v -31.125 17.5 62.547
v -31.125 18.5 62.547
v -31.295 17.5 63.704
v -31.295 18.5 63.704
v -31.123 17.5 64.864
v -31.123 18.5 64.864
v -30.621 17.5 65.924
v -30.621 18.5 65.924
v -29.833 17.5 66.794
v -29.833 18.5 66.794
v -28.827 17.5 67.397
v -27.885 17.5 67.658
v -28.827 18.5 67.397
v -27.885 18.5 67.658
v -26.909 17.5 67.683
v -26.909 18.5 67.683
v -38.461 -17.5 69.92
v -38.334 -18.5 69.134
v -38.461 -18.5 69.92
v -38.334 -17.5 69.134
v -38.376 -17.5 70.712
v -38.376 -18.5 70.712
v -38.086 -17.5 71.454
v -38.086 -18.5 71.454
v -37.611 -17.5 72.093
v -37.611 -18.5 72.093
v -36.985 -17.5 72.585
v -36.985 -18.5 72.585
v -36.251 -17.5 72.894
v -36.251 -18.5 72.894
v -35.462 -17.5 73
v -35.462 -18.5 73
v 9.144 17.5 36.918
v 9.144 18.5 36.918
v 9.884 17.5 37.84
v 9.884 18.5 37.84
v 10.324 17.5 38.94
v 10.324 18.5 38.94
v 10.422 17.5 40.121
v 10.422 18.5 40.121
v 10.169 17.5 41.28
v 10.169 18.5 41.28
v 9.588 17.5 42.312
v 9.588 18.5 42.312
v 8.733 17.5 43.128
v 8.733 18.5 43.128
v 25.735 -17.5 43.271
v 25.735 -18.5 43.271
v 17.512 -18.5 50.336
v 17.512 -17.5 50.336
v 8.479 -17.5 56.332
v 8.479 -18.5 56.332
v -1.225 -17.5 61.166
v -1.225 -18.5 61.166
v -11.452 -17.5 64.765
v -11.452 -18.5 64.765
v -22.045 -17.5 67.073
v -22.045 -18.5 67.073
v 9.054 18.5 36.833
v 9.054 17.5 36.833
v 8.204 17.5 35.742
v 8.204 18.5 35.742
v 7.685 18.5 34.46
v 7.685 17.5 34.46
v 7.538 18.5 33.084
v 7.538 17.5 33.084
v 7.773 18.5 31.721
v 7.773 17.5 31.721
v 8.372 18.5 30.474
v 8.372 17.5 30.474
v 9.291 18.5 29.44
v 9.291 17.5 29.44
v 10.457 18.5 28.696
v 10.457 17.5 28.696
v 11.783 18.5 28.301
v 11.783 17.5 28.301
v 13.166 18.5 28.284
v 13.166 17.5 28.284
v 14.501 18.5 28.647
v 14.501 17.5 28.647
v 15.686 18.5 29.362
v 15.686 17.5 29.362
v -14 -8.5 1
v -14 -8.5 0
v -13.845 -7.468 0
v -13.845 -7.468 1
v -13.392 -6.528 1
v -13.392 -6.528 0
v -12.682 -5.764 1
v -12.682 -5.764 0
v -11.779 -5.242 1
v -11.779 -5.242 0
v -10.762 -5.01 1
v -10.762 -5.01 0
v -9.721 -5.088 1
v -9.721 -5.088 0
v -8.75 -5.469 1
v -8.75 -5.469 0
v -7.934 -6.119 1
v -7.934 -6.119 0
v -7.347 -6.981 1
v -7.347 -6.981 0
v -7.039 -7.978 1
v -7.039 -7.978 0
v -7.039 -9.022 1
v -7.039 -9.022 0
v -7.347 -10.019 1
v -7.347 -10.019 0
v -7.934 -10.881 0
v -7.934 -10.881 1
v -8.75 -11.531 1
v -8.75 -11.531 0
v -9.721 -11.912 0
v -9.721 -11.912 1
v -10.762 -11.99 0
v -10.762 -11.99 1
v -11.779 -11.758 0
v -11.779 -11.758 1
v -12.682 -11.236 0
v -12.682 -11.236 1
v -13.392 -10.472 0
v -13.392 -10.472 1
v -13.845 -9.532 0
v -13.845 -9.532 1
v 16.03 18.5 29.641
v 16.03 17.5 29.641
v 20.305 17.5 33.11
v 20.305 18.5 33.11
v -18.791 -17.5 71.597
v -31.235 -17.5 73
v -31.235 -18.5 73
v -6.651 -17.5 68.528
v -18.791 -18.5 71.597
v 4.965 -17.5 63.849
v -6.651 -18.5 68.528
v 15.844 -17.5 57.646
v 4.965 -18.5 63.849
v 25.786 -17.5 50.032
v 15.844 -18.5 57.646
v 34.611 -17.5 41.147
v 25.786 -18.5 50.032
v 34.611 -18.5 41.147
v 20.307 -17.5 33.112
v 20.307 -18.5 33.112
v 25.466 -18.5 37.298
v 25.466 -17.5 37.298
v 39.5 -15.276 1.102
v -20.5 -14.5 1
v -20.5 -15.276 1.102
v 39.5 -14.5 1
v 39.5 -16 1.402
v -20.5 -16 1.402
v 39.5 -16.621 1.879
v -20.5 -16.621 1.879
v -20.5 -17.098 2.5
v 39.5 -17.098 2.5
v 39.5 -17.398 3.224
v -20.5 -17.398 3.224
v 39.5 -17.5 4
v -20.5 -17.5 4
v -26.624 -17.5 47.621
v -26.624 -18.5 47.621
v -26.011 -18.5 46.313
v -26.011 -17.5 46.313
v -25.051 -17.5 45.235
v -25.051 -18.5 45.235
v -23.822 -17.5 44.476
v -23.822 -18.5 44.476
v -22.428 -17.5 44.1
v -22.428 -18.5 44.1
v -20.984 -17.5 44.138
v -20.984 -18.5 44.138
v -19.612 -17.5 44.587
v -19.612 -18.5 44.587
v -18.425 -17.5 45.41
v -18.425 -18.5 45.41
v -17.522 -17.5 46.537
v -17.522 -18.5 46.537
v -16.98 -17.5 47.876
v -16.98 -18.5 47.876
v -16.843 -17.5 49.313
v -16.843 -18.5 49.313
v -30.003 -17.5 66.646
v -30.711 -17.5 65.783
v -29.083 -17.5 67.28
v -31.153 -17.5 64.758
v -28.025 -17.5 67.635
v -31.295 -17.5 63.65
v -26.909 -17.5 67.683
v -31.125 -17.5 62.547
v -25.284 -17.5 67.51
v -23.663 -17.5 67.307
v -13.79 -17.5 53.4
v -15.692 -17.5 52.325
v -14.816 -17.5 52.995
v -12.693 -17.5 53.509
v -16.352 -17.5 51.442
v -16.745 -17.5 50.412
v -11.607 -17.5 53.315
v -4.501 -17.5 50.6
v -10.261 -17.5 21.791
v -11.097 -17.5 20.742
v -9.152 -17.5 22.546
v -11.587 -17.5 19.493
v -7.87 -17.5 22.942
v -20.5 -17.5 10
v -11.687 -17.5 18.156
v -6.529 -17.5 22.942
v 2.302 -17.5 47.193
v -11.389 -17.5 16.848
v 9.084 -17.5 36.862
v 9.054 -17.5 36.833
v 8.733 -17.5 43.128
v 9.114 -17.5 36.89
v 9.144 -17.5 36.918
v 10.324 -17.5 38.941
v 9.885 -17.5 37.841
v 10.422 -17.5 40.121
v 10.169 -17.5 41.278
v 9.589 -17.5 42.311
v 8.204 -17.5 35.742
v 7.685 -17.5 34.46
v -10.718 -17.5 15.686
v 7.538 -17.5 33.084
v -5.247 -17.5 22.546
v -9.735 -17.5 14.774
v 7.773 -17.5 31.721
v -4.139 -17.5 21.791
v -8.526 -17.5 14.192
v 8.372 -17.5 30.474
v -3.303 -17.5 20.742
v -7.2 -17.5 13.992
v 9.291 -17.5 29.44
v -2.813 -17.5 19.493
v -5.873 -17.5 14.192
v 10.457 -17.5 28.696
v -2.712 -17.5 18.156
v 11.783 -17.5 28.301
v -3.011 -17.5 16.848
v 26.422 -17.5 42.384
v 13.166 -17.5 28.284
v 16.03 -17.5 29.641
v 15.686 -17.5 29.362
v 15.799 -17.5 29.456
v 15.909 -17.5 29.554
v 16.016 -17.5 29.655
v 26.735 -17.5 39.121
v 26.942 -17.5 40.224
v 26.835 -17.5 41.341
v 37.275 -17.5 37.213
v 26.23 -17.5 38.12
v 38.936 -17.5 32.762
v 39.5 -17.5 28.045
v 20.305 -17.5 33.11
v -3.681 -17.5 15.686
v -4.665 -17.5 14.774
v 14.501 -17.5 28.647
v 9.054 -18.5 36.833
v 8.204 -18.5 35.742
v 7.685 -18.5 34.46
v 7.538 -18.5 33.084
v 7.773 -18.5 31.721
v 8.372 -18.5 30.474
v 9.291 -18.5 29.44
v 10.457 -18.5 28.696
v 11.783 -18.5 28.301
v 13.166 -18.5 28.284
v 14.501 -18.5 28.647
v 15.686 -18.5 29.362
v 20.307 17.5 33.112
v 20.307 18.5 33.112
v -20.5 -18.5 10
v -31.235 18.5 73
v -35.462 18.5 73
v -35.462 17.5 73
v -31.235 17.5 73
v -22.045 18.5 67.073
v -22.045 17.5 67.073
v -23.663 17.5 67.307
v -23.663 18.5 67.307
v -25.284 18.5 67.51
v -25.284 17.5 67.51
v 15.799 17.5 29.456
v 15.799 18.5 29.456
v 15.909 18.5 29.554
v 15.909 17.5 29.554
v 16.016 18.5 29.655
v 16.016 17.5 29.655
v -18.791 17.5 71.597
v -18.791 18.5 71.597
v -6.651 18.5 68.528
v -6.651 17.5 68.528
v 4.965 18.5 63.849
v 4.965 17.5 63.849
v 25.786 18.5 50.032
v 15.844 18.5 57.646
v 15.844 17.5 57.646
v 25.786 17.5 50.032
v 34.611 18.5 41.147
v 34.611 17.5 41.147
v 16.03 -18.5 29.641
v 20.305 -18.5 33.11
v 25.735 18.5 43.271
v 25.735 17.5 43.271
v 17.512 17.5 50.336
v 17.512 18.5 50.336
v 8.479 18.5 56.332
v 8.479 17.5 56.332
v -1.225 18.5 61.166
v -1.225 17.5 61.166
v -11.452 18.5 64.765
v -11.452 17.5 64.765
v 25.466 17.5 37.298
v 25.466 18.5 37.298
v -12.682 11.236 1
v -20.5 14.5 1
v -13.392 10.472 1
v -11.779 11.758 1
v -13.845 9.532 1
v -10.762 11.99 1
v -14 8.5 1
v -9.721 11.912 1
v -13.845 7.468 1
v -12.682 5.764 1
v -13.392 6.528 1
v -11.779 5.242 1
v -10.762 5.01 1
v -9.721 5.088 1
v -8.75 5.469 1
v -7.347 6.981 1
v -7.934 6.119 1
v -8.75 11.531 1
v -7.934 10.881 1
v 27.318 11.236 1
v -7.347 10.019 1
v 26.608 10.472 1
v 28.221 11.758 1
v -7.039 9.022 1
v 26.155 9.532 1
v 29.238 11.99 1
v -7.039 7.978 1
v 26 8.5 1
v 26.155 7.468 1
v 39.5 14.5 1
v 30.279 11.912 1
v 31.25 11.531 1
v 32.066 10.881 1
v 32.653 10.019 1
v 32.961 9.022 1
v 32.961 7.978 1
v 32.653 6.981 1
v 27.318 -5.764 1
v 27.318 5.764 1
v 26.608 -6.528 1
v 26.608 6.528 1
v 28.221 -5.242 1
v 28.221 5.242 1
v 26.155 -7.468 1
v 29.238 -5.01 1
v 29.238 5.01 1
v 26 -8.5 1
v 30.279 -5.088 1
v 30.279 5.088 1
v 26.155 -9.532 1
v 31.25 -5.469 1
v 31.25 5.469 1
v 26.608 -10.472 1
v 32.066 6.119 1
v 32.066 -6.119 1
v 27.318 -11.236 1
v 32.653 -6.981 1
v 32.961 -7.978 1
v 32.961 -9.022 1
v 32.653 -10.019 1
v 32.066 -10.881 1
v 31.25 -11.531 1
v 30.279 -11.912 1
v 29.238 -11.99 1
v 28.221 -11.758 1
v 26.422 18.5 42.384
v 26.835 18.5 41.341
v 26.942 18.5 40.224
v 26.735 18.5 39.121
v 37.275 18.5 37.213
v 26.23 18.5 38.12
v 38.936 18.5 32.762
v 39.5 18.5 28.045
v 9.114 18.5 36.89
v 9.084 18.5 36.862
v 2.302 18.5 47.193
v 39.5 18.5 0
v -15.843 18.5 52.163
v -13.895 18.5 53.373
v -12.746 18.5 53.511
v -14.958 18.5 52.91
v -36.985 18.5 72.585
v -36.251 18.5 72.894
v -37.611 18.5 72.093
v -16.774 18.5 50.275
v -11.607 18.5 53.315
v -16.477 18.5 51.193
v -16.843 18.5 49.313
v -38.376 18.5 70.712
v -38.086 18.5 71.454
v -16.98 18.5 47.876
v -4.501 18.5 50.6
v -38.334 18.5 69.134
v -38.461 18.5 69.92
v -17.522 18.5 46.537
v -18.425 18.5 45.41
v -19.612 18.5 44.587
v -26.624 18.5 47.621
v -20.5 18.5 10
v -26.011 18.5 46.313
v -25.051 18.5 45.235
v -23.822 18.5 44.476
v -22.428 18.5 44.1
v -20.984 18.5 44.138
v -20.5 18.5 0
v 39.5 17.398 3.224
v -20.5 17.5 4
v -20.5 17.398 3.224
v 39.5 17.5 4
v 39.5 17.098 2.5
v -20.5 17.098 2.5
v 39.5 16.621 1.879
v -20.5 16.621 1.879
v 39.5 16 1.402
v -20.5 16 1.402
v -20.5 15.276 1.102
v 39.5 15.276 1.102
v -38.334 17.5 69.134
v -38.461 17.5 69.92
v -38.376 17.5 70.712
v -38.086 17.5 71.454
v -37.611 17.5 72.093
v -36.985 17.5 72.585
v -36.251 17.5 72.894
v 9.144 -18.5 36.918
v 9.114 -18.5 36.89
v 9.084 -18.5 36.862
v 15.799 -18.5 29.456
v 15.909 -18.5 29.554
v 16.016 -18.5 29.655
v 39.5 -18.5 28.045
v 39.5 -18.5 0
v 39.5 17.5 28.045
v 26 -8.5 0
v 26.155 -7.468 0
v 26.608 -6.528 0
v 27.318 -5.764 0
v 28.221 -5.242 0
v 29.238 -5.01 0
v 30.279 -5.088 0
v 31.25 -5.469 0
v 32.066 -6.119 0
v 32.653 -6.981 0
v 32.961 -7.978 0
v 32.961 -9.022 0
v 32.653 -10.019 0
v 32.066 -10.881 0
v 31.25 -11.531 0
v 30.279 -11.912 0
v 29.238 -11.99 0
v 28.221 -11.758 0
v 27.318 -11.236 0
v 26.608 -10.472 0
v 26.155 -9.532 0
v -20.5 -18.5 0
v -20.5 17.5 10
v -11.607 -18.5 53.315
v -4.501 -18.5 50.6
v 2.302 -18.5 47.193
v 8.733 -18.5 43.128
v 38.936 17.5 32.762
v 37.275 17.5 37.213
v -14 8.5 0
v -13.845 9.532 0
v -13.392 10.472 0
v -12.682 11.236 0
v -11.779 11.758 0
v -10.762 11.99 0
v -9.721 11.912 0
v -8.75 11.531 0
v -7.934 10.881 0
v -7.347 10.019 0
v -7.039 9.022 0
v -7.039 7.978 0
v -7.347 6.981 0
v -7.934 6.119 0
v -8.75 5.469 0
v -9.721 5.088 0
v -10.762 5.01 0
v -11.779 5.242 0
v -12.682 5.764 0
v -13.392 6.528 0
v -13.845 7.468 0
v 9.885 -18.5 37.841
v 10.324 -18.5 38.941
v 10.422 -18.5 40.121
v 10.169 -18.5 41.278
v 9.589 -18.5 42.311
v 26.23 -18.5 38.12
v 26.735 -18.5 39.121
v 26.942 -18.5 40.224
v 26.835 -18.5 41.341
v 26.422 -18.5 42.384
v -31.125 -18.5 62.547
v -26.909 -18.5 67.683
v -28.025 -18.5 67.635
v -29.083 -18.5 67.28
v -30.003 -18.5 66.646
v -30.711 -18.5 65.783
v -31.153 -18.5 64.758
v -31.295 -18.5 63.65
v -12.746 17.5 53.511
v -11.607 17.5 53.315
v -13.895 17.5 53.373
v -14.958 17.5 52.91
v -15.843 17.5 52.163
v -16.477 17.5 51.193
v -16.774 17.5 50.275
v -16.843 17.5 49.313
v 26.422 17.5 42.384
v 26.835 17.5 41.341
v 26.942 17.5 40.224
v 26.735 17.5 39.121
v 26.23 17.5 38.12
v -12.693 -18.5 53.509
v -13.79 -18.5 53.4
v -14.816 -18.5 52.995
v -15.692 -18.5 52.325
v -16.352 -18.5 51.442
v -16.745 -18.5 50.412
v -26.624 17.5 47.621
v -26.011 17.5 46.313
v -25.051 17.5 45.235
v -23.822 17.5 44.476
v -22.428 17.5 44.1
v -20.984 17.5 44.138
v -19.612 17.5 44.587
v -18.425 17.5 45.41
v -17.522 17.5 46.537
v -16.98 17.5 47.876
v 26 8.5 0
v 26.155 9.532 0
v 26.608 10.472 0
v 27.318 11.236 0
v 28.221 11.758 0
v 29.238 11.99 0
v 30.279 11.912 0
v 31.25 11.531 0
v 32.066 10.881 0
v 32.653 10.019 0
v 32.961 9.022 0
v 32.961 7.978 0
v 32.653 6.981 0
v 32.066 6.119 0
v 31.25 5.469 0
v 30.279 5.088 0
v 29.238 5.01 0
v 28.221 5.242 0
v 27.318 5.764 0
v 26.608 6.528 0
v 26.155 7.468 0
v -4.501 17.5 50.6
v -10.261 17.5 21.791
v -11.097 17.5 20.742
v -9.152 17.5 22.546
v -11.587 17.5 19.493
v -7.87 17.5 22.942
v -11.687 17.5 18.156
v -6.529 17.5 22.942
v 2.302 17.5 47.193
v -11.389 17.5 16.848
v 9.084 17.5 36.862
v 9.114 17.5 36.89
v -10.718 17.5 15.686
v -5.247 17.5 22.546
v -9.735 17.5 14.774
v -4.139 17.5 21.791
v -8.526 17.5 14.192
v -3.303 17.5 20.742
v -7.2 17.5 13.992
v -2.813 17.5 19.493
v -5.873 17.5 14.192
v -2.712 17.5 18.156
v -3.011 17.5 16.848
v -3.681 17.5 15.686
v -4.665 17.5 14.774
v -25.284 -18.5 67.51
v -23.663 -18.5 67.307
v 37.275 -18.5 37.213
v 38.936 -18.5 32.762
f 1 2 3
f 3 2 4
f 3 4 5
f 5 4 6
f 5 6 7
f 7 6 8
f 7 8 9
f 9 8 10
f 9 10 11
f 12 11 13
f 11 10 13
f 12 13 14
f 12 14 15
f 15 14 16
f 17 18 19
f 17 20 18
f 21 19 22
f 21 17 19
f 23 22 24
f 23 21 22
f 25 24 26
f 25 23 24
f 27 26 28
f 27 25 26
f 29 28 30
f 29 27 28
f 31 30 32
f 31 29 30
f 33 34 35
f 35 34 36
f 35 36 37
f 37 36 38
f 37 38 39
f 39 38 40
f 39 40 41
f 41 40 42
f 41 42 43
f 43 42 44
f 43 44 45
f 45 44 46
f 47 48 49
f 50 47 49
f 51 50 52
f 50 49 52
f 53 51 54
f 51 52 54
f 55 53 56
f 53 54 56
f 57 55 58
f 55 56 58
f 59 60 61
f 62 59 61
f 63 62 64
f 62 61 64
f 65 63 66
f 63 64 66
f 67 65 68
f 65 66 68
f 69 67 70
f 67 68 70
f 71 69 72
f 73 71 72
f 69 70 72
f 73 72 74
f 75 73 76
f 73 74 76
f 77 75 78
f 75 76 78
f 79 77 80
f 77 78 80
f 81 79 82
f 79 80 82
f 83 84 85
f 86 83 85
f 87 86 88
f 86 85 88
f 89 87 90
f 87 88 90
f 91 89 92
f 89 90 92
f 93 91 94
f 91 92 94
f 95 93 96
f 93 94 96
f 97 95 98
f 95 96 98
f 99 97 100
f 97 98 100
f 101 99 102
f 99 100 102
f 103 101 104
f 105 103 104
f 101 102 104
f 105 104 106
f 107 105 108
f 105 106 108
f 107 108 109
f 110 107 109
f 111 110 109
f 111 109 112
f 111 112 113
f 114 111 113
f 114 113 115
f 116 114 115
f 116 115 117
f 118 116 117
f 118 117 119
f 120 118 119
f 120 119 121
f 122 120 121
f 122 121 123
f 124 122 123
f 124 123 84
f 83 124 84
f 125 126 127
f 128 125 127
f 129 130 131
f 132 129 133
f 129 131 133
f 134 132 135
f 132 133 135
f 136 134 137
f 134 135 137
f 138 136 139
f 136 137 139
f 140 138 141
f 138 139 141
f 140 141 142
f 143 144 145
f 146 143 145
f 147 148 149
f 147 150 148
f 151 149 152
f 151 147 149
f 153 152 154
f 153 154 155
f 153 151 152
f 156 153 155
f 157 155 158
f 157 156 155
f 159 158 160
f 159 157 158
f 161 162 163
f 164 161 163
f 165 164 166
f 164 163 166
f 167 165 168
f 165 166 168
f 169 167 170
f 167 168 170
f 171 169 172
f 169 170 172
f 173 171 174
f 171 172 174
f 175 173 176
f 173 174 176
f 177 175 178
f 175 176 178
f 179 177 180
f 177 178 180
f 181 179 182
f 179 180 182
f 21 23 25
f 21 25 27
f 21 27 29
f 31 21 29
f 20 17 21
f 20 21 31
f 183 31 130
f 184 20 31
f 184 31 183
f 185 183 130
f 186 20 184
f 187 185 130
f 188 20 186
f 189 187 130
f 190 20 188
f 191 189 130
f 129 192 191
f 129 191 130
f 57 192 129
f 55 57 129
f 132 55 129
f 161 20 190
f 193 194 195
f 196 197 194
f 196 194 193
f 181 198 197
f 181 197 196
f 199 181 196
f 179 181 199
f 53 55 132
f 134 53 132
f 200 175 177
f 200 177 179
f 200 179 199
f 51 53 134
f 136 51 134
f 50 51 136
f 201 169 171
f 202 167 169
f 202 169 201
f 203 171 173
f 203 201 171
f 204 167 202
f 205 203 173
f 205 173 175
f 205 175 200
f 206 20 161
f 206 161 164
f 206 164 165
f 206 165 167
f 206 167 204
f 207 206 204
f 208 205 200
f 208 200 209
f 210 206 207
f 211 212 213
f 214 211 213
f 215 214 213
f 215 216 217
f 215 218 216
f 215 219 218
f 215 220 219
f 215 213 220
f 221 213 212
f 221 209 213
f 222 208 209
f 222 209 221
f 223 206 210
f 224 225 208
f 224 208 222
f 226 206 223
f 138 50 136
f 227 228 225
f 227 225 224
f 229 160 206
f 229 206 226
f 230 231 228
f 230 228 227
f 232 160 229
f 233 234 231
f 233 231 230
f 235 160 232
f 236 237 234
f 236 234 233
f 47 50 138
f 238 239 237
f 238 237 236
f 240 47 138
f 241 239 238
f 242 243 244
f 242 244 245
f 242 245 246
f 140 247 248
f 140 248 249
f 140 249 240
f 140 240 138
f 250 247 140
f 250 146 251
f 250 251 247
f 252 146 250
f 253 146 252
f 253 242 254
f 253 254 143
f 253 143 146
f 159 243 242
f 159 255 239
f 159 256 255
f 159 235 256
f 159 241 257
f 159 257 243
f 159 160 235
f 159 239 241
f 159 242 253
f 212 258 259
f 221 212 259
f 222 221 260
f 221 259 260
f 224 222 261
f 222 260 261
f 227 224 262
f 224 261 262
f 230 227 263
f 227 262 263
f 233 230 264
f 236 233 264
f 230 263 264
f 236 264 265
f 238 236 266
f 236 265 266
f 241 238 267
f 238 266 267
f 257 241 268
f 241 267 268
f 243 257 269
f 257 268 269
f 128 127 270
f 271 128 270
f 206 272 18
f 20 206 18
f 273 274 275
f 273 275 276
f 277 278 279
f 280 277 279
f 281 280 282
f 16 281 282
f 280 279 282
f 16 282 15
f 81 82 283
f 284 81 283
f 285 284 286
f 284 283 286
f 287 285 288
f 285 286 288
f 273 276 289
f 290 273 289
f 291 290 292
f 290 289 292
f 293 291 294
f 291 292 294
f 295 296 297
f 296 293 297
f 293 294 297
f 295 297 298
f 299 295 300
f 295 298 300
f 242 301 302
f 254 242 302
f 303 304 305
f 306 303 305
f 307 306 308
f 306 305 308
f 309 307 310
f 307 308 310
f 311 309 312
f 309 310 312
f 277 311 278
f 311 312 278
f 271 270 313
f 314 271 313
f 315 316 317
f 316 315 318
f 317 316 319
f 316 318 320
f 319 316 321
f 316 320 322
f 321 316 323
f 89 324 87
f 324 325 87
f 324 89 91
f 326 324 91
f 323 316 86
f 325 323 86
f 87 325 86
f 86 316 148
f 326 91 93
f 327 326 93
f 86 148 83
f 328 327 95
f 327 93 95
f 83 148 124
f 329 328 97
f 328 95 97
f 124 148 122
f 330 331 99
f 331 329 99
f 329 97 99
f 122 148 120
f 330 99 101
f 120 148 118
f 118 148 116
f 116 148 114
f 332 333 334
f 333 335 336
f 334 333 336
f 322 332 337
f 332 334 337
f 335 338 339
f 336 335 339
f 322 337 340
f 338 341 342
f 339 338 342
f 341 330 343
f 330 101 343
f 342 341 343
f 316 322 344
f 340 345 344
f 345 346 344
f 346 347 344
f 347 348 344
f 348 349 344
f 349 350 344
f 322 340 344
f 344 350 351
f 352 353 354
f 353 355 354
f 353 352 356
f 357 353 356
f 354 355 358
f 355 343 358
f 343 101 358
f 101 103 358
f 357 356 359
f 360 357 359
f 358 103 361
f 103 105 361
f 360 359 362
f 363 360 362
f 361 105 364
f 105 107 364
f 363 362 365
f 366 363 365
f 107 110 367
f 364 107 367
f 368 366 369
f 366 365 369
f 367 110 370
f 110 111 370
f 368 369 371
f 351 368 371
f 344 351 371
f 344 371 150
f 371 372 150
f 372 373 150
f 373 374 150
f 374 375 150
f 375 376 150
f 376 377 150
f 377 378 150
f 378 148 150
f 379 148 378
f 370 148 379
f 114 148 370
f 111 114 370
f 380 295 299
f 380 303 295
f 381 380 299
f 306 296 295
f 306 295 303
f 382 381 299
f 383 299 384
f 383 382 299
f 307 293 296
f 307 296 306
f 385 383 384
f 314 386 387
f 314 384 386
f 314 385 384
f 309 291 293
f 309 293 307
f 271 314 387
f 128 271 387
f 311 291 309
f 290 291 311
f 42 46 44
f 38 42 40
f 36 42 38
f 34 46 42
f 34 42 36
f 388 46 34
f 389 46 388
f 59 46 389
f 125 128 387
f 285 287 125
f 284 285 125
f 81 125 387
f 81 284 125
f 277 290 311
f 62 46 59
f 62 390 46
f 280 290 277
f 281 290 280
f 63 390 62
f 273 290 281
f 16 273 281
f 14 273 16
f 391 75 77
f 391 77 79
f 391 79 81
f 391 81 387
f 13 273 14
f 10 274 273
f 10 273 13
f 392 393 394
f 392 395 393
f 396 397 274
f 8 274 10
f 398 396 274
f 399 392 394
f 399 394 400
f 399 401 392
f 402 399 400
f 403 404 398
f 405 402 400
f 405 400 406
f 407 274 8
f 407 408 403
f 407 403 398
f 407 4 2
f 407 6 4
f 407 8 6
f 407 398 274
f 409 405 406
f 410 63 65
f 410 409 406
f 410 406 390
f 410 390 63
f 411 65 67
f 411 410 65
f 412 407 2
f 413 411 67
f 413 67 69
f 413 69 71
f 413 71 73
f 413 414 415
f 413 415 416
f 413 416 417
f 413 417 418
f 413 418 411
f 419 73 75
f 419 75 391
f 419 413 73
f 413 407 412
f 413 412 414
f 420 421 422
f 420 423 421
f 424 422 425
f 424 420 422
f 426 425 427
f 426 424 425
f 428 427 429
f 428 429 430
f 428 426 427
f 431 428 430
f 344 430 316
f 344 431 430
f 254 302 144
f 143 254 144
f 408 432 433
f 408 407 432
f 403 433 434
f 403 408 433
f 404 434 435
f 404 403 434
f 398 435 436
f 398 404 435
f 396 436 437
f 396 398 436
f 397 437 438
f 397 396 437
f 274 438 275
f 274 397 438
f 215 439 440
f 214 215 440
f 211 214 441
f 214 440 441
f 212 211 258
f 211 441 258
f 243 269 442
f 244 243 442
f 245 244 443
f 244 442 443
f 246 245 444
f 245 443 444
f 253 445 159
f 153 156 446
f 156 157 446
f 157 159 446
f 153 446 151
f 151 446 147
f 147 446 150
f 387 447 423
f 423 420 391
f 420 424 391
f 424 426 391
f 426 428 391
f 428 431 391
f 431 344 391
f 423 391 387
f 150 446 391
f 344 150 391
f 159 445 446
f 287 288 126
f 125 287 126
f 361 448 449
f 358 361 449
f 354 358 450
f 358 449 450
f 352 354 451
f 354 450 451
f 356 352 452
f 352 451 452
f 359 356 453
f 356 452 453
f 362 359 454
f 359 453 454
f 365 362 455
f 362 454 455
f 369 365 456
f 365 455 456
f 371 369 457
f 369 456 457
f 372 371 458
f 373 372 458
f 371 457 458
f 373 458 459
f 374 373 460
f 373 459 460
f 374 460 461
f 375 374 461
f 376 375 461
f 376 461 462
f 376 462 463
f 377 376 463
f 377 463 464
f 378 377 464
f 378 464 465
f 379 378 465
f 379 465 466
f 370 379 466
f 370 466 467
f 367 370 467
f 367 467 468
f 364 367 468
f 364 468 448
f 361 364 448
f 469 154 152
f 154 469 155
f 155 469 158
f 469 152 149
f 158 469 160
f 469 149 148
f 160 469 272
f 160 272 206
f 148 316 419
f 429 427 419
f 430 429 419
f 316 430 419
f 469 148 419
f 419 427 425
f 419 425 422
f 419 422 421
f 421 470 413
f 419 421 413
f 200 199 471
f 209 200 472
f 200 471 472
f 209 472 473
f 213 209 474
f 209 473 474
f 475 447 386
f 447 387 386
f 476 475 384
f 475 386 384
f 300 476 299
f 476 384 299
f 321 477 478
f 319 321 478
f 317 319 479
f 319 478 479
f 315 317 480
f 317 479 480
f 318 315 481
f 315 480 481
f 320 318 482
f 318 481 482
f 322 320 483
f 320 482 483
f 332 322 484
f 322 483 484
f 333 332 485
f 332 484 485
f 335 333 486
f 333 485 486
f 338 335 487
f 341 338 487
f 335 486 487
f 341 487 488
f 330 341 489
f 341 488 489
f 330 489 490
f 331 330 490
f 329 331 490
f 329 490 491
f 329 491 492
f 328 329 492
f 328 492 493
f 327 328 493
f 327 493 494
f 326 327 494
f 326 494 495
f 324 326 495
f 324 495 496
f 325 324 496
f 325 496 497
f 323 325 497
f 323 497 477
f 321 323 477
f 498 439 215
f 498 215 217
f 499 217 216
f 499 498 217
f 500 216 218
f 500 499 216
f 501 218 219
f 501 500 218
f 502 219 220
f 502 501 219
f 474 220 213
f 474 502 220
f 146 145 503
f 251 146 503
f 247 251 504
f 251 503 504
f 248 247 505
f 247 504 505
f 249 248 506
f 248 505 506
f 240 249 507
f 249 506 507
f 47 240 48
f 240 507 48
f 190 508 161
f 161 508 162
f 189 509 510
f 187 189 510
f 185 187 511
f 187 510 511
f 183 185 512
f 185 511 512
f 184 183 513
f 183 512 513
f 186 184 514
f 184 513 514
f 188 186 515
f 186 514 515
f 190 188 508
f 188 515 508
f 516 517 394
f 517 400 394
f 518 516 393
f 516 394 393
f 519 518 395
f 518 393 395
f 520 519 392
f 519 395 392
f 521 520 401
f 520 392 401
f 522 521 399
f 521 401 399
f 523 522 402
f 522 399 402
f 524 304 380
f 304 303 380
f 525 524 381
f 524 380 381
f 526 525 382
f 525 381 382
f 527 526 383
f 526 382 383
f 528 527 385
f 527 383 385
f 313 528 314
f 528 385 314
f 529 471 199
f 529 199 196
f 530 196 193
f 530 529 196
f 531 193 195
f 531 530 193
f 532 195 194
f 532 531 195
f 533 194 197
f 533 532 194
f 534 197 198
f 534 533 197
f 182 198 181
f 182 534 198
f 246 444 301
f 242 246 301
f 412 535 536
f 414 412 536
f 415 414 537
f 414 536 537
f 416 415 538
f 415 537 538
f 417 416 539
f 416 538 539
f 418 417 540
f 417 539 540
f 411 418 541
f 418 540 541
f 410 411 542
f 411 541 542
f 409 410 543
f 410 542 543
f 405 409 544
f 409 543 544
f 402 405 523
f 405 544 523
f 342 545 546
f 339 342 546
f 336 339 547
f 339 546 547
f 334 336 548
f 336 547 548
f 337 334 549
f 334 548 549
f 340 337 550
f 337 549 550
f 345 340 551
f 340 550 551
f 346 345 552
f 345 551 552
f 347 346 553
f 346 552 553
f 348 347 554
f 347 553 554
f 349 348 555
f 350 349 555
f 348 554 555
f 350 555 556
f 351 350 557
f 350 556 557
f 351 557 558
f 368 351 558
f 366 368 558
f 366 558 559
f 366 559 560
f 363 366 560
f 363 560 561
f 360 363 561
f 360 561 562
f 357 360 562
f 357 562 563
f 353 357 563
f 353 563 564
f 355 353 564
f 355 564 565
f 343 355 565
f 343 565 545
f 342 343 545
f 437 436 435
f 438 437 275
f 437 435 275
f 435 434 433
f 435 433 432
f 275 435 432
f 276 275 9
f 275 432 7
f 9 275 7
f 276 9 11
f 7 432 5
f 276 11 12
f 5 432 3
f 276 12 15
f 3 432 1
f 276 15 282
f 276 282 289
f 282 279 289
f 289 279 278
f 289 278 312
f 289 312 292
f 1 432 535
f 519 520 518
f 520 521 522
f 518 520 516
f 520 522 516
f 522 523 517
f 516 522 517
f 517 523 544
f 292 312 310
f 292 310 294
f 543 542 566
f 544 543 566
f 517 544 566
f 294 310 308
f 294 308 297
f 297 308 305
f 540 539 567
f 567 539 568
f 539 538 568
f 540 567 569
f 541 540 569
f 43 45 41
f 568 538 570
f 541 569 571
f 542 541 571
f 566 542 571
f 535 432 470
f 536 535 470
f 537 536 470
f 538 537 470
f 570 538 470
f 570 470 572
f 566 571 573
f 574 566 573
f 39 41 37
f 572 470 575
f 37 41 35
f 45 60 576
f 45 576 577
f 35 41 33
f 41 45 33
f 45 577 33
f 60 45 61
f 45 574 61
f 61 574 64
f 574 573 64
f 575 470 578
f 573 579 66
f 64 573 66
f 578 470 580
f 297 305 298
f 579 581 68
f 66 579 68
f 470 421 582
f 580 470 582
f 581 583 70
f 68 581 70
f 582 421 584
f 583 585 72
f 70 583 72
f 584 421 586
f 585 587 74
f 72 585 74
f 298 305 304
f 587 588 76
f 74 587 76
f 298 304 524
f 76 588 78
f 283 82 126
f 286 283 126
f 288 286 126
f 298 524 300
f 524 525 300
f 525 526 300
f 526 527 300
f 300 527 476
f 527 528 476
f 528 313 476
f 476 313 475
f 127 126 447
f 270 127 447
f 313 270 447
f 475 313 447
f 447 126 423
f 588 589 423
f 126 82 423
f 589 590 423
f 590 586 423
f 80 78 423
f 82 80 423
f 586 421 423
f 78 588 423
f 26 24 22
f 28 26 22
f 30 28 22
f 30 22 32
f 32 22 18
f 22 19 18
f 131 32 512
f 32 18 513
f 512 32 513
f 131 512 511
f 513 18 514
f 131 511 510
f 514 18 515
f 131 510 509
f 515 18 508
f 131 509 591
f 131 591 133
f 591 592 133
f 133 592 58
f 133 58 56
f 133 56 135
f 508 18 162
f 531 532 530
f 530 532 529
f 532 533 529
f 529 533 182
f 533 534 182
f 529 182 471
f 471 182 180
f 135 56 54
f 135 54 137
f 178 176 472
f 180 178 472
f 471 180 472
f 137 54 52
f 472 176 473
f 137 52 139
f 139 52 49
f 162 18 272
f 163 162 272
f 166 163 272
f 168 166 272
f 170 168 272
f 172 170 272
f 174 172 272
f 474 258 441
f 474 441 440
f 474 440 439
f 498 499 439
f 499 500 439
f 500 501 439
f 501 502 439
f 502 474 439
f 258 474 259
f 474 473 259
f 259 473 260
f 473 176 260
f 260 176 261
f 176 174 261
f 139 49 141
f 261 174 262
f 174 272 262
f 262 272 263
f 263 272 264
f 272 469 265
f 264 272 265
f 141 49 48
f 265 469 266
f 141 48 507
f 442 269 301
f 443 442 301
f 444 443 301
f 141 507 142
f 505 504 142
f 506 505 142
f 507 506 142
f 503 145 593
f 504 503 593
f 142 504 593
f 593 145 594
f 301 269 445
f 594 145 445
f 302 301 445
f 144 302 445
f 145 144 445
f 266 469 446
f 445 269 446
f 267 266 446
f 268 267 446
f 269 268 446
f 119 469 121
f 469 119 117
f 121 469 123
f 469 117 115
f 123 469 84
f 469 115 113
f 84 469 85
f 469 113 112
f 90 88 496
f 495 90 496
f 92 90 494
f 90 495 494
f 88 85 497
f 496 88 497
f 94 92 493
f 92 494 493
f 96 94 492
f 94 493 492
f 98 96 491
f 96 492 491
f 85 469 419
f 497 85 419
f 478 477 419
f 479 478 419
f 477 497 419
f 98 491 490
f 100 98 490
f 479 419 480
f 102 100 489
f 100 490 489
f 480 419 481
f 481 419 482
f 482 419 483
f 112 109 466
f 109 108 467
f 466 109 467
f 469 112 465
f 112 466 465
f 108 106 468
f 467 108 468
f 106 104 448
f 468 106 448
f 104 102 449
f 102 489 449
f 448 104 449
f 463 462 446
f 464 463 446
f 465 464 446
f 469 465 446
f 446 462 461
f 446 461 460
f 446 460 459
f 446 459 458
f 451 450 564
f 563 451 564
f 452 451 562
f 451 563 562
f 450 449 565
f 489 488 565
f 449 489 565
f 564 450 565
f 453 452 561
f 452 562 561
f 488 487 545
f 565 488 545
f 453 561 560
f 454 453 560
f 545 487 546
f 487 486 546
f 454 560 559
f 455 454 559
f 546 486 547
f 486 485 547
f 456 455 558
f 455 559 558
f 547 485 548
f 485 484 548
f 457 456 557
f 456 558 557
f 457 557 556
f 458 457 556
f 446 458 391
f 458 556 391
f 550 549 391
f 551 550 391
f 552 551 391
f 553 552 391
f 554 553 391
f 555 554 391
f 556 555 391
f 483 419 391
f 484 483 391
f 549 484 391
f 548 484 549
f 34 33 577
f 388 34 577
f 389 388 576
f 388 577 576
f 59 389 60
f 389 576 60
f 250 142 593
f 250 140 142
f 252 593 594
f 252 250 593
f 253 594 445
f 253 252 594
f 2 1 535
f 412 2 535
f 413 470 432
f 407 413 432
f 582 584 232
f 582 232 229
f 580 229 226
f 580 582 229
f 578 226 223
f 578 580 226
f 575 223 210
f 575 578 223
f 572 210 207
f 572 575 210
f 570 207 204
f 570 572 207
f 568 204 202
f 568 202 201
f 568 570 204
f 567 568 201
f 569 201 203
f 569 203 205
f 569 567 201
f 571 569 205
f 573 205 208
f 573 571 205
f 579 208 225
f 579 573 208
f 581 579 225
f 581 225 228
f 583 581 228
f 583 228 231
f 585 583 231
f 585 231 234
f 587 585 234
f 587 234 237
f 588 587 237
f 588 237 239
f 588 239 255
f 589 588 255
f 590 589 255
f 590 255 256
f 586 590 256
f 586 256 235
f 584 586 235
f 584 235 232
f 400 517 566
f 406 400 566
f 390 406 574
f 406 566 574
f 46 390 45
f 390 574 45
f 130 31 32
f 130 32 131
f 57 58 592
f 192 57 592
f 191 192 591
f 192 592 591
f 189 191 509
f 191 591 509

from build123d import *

# Parameters (mm, degrees)
CROQUIS1_W                   = 79
CROQUIS1_H                   = 35
SALIENTE_EXTRUIR1_DEPTH      = 1
SALIENTE_EXTRUIR3_DEPTH      = 72
SALIENTE_EXTRUIR3_DEPTH_BACK = 1
CROQUIS2_W                   = 79
CROQUIS2_H                   = 1
CORTAR_EXTRUIR1_DEPTH        = 72
CORTAR_EXTRUIR2_DEPTH        = 72
CORTAR_EXTRUIR3_DEPTH        = 72
REDONDEO4_R                  = 3
REDONDEO5_R                  = 20
REDONDEO6_R                  = 3
CORTAR_EXTRUIR4_DEPTH        = 72
REDONDEO7_START              = -18.5
REDONDEO7_DEPTH              = 1
REDONDEO7_2_DEPTH            = 1
REDONDEO8_R                  = 4
REDONDEO9_R                  = 3
CROQUIS8_R                   = 3.5
CORTAR_EXTRUIR5_DEPTH        = 72
CROQUIS13_R                  = 4.5
SALIENTE_EXTRUIR7_DEPTH      = 37


with BuildPart() as part:
    # Croquis1 → Saliente-Extruir1 (new body)
    with BuildSketch(Plane.XY):
        Rectangle(CROQUIS1_W, CROQUIS1_H)
    extrude(amount=SALIENTE_EXTRUIR1_DEPTH)

    # Croquis2 → Saliente-Extruir3 (add, two sides: drawn at the far end of the back side and taken through both)
    with BuildSketch(Plane.XY.offset(1).offset(-SALIENTE_EXTRUIR3_DEPTH_BACK)):
        with Locations((0, -18)):
            Rectangle(CROQUIS2_W, CROQUIS2_H)
        with Locations((0, 18)):
            Rectangle(CROQUIS2_W, CROQUIS2_H)
    extrude(amount=SALIENTE_EXTRUIR3_DEPTH + SALIENTE_EXTRUIR3_DEPTH_BACK)

    # Croquis3 → Cortar-Extruir1 (cut)
    with BuildSketch(Plane.XZ.offset(18.5)):
        Polygon((-39.5, 1), (-20.5, 1), (-20.5, 10), (-39.5, 73), align=None)
    extrude(amount=-CORTAR_EXTRUIR1_DEPTH, mode=Mode.SUBTRACT)

    # Croquis4 → Cortar-Extruir2 (cut)
    with BuildSketch(Plane.XY.offset(1)):
        Polygon((-20.5, 17.5), (-20.5, 18.5), (-39.5, 18.5), (-39.5, -18.5), (-20.5, -18.5), (-20.5, -17.5), align=None)
    extrude(amount=-CORTAR_EXTRUIR2_DEPTH, mode=Mode.SUBTRACT)

    # Croquis5 → Cortar-Extruir3 (cut)
    with BuildSketch(Plane.XZ.offset(18.5)):
        with BuildLine():
            ThreePointArc((-31.235435529, 73), (8.464348123, 62.063962298), (39.5, 35))
            Line((39.5, 35), (39.5, 73))
            Line((39.5, 73), (-31.235435529, 73))
        make_face()
    extrude(amount=-CORTAR_EXTRUIR3_DEPTH, mode=Mode.SUBTRACT)

    # Redondeo4
    redondeo4_edges = [part.edges().sort_by_distance(p)[0] for p in [
        (-39.5, -18, 73),
    ]]
    fillet(redondeo4_edges, radius=REDONDEO4_R)

    # Redondeo5
    redondeo5_edges = [part.edges().sort_by_distance(p)[0] for p in [
        (39.5, 18, 35),
        (39.5, -18, 35),
    ]]
    fillet(redondeo5_edges, radius=REDONDEO5_R)

    # Redondeo6
    redondeo6_edges = [part.edges().sort_by_distance(p)[0] for p in [
        (-39.5, 18, 73),
    ]]
    fillet(redondeo6_edges, radius=REDONDEO6_R)

    # Croquis6 → Cortar-Extruir4 (cut)
    with BuildSketch(Plane.XZ.offset(18.5)):
        with BuildLine():
            Line((16.016209597, 29.655049393), (16.02986755, 29.640967118))
            Line((16.02986755, 29.640967118), (20.305135111, 33.109993252))
            Line((20.305135111, 33.109993252), (20.307251231, 33.111710308))
            Line((20.307251231, 33.111710308), (28.870480014, 40.060062433))
            ThreePointArc((28.870480014, 40.060062433), (5.697385816, 57.873252637), (-22.045320516, 67.073485531))
            ThreePointArc((-22.045320516, 67.073485531), (-26.684583157, 67.660916613), (-31.348578825, 68))
            Line((-31.348578825, 68), (-32.769624166, 68))
            Line((-32.769624166, 68), (-26.623611491, 47.621115867))
            ThreePointArc((-26.623611491, 47.621115867), (-20.392867483, 44.277789814), (-17.049541429, 50.508533823))
            Line((-17.049541429, 50.508533823), (-18.465863192, 55.204758613))
            ThreePointArc((-18.465863192, 55.204758613), (-1.905942772, 49.399230787), (12.898781807, 39.978230428))
            ThreePointArc((12.898781807, 39.978230428), (12.954271862, 39.933178304), (13.009719865, 39.888074435))
            Line((13.009719865, 39.888074435), (9.803992697, 37.43240656))
            Line((9.803992697, 37.43240656), (9.202695315, 36.971797598))
            ThreePointArc((9.202695315, 36.971797598), (9.127703809, 36.903372112), (9.054116963, 36.833438221))
            ThreePointArc((9.054116963, 36.833438221), (8.795597311, 29.925261077), (15.685593651, 29.361617315))
            ThreePointArc((15.685593651, 29.361617315), (15.85414601, 29.504677838), (16.016209597, 29.655049393))
        make_face()
    extrude(amount=-CORTAR_EXTRUIR4_DEPTH, mode=Mode.SUBTRACT)

    # Redondeo7: read off the stored shape, not the designer's step
    # Redondeo7 outline → Redondeo7 (cut)
    with BuildSketch(Plane(origin=(0, 0, 0), x_dir=(1, 0, 0), z_dir=(0, 1, 0)).offset(REDONDEO7_START)):
        with BuildLine():
            ThreePointArc((9.143619043, -36.918128357), (10.421654669, -40.121349), (8.732679814, -43.12823468))
            ThreePointArc((8.732679814, -43.12823468), (10.899572634, -41.545606896), (13.009719865, -39.888074435))
            Line((13.009719865, -39.888074435), (9.202695315, -36.971797598))
            ThreePointArc((9.202695315, -36.971797598), (9.173050087, -36.945080858), (9.143619043, -36.918128357))
        make_face()
        with BuildLine():
            ThreePointArc((-18.465863192, -55.204758613), (-15.014619907, -54.339507434), (-11.607267341, -53.314964462))
            ThreePointArc((-11.607267341, -53.314964462), (-15.276738996, -52.690173302), (-16.842756461, -49.313344091))
            ThreePointArc((-16.842756461, -49.313344091), (-16.90977213, -49.917232668), (-17.049541429, -50.508533823))
            Line((-17.049541429, -50.508533823), (-18.465863192, -55.204758613))
        make_face()
    extrude(amount=REDONDEO7_DEPTH, mode=Mode.SUBTRACT)

    # Redondeo7 2 outline → Redondeo7 2 (add)
    with BuildSketch(Plane(origin=(0, 0, 0), x_dir=(1, 0, 0), z_dir=(0, 1, 0)).offset(REDONDEO7_START)):
        with BuildLine():
            ThreePointArc((25.466305511, -37.297856291), (26.941907185, -40.223913599), (25.735427009, -43.270816494))
            ThreePointArc((25.735427009, -43.270816494), (27.323511874, -41.685513114), (28.870480014, -40.060062433))
            Line((28.870480014, -40.060062433), (25.466305511, -37.297856291))
        make_face()
        with BuildLine():
            ThreePointArc((-26.909207237, -67.682994851), (-30.387237337, -66.239442173), (-31.124981113, -62.546709875))
            Line((-31.124981113, -62.546709875), (-32.769624166, -68))
            Line((-32.769624166, -68), (-31.348578825, -68))
            ThreePointArc((-31.348578825, -68), (-29.12687991, -67.869689367), (-26.909207237, -67.682994851))
        make_face()
    extrude(amount=REDONDEO7_2_DEPTH)

    # Redondeo8
    redondeo8_edges = [part.edges().sort_by_distance(p)[0] for p in [
        (-18.465863192, 18, 55.204758613),
        (28.870480014, 18, 40.060062433),
        (-32.769624166, 18, 68),
        (13.009719865, 18, 39.888074435),
    ]]
    fillet(redondeo8_edges, radius=REDONDEO8_R)

    # Redondeo9
    redondeo9_edges = [part.edges().sort_by_distance(p)[0] for p in [
        (9.5, -17.5, 1),
        (9.5, 17.5, 1),
    ]]
    fillet(redondeo9_edges, radius=REDONDEO9_R)

    # Croquis8 → Cortar-Extruir5 (cut)
    with BuildSketch(Plane(origin=(0, 0, 0), x_dir=(-1, 0, 0), z_dir=(0, 0, -1))):
        with Locations((10.5, 8.5)):
            Circle(CROQUIS8_R)
        with Locations((-29.5, 8.5)):
            Circle(CROQUIS8_R)
        with Locations((-29.5, -8.5)):
            Circle(CROQUIS8_R)
        with Locations((10.5, -8.5)):
            Circle(CROQUIS8_R)
    extrude(amount=-CORTAR_EXTRUIR5_DEPTH, mode=Mode.SUBTRACT)

    # Croquis13 → Saliente-Extruir7 (add)
    with BuildSketch(Plane(origin=(0, 18.5, 0), x_dir=(1, 0, 0), z_dir=(0, 1, 0))):
        with Locations(Location((-7.199736414, -18.491822177, 0), (0, 0, 90))):
            Circle(CROQUIS13_R)
    extrude(amount=-SALIENTE_EXTRUIR7_DEPTH)


solid = part.part
